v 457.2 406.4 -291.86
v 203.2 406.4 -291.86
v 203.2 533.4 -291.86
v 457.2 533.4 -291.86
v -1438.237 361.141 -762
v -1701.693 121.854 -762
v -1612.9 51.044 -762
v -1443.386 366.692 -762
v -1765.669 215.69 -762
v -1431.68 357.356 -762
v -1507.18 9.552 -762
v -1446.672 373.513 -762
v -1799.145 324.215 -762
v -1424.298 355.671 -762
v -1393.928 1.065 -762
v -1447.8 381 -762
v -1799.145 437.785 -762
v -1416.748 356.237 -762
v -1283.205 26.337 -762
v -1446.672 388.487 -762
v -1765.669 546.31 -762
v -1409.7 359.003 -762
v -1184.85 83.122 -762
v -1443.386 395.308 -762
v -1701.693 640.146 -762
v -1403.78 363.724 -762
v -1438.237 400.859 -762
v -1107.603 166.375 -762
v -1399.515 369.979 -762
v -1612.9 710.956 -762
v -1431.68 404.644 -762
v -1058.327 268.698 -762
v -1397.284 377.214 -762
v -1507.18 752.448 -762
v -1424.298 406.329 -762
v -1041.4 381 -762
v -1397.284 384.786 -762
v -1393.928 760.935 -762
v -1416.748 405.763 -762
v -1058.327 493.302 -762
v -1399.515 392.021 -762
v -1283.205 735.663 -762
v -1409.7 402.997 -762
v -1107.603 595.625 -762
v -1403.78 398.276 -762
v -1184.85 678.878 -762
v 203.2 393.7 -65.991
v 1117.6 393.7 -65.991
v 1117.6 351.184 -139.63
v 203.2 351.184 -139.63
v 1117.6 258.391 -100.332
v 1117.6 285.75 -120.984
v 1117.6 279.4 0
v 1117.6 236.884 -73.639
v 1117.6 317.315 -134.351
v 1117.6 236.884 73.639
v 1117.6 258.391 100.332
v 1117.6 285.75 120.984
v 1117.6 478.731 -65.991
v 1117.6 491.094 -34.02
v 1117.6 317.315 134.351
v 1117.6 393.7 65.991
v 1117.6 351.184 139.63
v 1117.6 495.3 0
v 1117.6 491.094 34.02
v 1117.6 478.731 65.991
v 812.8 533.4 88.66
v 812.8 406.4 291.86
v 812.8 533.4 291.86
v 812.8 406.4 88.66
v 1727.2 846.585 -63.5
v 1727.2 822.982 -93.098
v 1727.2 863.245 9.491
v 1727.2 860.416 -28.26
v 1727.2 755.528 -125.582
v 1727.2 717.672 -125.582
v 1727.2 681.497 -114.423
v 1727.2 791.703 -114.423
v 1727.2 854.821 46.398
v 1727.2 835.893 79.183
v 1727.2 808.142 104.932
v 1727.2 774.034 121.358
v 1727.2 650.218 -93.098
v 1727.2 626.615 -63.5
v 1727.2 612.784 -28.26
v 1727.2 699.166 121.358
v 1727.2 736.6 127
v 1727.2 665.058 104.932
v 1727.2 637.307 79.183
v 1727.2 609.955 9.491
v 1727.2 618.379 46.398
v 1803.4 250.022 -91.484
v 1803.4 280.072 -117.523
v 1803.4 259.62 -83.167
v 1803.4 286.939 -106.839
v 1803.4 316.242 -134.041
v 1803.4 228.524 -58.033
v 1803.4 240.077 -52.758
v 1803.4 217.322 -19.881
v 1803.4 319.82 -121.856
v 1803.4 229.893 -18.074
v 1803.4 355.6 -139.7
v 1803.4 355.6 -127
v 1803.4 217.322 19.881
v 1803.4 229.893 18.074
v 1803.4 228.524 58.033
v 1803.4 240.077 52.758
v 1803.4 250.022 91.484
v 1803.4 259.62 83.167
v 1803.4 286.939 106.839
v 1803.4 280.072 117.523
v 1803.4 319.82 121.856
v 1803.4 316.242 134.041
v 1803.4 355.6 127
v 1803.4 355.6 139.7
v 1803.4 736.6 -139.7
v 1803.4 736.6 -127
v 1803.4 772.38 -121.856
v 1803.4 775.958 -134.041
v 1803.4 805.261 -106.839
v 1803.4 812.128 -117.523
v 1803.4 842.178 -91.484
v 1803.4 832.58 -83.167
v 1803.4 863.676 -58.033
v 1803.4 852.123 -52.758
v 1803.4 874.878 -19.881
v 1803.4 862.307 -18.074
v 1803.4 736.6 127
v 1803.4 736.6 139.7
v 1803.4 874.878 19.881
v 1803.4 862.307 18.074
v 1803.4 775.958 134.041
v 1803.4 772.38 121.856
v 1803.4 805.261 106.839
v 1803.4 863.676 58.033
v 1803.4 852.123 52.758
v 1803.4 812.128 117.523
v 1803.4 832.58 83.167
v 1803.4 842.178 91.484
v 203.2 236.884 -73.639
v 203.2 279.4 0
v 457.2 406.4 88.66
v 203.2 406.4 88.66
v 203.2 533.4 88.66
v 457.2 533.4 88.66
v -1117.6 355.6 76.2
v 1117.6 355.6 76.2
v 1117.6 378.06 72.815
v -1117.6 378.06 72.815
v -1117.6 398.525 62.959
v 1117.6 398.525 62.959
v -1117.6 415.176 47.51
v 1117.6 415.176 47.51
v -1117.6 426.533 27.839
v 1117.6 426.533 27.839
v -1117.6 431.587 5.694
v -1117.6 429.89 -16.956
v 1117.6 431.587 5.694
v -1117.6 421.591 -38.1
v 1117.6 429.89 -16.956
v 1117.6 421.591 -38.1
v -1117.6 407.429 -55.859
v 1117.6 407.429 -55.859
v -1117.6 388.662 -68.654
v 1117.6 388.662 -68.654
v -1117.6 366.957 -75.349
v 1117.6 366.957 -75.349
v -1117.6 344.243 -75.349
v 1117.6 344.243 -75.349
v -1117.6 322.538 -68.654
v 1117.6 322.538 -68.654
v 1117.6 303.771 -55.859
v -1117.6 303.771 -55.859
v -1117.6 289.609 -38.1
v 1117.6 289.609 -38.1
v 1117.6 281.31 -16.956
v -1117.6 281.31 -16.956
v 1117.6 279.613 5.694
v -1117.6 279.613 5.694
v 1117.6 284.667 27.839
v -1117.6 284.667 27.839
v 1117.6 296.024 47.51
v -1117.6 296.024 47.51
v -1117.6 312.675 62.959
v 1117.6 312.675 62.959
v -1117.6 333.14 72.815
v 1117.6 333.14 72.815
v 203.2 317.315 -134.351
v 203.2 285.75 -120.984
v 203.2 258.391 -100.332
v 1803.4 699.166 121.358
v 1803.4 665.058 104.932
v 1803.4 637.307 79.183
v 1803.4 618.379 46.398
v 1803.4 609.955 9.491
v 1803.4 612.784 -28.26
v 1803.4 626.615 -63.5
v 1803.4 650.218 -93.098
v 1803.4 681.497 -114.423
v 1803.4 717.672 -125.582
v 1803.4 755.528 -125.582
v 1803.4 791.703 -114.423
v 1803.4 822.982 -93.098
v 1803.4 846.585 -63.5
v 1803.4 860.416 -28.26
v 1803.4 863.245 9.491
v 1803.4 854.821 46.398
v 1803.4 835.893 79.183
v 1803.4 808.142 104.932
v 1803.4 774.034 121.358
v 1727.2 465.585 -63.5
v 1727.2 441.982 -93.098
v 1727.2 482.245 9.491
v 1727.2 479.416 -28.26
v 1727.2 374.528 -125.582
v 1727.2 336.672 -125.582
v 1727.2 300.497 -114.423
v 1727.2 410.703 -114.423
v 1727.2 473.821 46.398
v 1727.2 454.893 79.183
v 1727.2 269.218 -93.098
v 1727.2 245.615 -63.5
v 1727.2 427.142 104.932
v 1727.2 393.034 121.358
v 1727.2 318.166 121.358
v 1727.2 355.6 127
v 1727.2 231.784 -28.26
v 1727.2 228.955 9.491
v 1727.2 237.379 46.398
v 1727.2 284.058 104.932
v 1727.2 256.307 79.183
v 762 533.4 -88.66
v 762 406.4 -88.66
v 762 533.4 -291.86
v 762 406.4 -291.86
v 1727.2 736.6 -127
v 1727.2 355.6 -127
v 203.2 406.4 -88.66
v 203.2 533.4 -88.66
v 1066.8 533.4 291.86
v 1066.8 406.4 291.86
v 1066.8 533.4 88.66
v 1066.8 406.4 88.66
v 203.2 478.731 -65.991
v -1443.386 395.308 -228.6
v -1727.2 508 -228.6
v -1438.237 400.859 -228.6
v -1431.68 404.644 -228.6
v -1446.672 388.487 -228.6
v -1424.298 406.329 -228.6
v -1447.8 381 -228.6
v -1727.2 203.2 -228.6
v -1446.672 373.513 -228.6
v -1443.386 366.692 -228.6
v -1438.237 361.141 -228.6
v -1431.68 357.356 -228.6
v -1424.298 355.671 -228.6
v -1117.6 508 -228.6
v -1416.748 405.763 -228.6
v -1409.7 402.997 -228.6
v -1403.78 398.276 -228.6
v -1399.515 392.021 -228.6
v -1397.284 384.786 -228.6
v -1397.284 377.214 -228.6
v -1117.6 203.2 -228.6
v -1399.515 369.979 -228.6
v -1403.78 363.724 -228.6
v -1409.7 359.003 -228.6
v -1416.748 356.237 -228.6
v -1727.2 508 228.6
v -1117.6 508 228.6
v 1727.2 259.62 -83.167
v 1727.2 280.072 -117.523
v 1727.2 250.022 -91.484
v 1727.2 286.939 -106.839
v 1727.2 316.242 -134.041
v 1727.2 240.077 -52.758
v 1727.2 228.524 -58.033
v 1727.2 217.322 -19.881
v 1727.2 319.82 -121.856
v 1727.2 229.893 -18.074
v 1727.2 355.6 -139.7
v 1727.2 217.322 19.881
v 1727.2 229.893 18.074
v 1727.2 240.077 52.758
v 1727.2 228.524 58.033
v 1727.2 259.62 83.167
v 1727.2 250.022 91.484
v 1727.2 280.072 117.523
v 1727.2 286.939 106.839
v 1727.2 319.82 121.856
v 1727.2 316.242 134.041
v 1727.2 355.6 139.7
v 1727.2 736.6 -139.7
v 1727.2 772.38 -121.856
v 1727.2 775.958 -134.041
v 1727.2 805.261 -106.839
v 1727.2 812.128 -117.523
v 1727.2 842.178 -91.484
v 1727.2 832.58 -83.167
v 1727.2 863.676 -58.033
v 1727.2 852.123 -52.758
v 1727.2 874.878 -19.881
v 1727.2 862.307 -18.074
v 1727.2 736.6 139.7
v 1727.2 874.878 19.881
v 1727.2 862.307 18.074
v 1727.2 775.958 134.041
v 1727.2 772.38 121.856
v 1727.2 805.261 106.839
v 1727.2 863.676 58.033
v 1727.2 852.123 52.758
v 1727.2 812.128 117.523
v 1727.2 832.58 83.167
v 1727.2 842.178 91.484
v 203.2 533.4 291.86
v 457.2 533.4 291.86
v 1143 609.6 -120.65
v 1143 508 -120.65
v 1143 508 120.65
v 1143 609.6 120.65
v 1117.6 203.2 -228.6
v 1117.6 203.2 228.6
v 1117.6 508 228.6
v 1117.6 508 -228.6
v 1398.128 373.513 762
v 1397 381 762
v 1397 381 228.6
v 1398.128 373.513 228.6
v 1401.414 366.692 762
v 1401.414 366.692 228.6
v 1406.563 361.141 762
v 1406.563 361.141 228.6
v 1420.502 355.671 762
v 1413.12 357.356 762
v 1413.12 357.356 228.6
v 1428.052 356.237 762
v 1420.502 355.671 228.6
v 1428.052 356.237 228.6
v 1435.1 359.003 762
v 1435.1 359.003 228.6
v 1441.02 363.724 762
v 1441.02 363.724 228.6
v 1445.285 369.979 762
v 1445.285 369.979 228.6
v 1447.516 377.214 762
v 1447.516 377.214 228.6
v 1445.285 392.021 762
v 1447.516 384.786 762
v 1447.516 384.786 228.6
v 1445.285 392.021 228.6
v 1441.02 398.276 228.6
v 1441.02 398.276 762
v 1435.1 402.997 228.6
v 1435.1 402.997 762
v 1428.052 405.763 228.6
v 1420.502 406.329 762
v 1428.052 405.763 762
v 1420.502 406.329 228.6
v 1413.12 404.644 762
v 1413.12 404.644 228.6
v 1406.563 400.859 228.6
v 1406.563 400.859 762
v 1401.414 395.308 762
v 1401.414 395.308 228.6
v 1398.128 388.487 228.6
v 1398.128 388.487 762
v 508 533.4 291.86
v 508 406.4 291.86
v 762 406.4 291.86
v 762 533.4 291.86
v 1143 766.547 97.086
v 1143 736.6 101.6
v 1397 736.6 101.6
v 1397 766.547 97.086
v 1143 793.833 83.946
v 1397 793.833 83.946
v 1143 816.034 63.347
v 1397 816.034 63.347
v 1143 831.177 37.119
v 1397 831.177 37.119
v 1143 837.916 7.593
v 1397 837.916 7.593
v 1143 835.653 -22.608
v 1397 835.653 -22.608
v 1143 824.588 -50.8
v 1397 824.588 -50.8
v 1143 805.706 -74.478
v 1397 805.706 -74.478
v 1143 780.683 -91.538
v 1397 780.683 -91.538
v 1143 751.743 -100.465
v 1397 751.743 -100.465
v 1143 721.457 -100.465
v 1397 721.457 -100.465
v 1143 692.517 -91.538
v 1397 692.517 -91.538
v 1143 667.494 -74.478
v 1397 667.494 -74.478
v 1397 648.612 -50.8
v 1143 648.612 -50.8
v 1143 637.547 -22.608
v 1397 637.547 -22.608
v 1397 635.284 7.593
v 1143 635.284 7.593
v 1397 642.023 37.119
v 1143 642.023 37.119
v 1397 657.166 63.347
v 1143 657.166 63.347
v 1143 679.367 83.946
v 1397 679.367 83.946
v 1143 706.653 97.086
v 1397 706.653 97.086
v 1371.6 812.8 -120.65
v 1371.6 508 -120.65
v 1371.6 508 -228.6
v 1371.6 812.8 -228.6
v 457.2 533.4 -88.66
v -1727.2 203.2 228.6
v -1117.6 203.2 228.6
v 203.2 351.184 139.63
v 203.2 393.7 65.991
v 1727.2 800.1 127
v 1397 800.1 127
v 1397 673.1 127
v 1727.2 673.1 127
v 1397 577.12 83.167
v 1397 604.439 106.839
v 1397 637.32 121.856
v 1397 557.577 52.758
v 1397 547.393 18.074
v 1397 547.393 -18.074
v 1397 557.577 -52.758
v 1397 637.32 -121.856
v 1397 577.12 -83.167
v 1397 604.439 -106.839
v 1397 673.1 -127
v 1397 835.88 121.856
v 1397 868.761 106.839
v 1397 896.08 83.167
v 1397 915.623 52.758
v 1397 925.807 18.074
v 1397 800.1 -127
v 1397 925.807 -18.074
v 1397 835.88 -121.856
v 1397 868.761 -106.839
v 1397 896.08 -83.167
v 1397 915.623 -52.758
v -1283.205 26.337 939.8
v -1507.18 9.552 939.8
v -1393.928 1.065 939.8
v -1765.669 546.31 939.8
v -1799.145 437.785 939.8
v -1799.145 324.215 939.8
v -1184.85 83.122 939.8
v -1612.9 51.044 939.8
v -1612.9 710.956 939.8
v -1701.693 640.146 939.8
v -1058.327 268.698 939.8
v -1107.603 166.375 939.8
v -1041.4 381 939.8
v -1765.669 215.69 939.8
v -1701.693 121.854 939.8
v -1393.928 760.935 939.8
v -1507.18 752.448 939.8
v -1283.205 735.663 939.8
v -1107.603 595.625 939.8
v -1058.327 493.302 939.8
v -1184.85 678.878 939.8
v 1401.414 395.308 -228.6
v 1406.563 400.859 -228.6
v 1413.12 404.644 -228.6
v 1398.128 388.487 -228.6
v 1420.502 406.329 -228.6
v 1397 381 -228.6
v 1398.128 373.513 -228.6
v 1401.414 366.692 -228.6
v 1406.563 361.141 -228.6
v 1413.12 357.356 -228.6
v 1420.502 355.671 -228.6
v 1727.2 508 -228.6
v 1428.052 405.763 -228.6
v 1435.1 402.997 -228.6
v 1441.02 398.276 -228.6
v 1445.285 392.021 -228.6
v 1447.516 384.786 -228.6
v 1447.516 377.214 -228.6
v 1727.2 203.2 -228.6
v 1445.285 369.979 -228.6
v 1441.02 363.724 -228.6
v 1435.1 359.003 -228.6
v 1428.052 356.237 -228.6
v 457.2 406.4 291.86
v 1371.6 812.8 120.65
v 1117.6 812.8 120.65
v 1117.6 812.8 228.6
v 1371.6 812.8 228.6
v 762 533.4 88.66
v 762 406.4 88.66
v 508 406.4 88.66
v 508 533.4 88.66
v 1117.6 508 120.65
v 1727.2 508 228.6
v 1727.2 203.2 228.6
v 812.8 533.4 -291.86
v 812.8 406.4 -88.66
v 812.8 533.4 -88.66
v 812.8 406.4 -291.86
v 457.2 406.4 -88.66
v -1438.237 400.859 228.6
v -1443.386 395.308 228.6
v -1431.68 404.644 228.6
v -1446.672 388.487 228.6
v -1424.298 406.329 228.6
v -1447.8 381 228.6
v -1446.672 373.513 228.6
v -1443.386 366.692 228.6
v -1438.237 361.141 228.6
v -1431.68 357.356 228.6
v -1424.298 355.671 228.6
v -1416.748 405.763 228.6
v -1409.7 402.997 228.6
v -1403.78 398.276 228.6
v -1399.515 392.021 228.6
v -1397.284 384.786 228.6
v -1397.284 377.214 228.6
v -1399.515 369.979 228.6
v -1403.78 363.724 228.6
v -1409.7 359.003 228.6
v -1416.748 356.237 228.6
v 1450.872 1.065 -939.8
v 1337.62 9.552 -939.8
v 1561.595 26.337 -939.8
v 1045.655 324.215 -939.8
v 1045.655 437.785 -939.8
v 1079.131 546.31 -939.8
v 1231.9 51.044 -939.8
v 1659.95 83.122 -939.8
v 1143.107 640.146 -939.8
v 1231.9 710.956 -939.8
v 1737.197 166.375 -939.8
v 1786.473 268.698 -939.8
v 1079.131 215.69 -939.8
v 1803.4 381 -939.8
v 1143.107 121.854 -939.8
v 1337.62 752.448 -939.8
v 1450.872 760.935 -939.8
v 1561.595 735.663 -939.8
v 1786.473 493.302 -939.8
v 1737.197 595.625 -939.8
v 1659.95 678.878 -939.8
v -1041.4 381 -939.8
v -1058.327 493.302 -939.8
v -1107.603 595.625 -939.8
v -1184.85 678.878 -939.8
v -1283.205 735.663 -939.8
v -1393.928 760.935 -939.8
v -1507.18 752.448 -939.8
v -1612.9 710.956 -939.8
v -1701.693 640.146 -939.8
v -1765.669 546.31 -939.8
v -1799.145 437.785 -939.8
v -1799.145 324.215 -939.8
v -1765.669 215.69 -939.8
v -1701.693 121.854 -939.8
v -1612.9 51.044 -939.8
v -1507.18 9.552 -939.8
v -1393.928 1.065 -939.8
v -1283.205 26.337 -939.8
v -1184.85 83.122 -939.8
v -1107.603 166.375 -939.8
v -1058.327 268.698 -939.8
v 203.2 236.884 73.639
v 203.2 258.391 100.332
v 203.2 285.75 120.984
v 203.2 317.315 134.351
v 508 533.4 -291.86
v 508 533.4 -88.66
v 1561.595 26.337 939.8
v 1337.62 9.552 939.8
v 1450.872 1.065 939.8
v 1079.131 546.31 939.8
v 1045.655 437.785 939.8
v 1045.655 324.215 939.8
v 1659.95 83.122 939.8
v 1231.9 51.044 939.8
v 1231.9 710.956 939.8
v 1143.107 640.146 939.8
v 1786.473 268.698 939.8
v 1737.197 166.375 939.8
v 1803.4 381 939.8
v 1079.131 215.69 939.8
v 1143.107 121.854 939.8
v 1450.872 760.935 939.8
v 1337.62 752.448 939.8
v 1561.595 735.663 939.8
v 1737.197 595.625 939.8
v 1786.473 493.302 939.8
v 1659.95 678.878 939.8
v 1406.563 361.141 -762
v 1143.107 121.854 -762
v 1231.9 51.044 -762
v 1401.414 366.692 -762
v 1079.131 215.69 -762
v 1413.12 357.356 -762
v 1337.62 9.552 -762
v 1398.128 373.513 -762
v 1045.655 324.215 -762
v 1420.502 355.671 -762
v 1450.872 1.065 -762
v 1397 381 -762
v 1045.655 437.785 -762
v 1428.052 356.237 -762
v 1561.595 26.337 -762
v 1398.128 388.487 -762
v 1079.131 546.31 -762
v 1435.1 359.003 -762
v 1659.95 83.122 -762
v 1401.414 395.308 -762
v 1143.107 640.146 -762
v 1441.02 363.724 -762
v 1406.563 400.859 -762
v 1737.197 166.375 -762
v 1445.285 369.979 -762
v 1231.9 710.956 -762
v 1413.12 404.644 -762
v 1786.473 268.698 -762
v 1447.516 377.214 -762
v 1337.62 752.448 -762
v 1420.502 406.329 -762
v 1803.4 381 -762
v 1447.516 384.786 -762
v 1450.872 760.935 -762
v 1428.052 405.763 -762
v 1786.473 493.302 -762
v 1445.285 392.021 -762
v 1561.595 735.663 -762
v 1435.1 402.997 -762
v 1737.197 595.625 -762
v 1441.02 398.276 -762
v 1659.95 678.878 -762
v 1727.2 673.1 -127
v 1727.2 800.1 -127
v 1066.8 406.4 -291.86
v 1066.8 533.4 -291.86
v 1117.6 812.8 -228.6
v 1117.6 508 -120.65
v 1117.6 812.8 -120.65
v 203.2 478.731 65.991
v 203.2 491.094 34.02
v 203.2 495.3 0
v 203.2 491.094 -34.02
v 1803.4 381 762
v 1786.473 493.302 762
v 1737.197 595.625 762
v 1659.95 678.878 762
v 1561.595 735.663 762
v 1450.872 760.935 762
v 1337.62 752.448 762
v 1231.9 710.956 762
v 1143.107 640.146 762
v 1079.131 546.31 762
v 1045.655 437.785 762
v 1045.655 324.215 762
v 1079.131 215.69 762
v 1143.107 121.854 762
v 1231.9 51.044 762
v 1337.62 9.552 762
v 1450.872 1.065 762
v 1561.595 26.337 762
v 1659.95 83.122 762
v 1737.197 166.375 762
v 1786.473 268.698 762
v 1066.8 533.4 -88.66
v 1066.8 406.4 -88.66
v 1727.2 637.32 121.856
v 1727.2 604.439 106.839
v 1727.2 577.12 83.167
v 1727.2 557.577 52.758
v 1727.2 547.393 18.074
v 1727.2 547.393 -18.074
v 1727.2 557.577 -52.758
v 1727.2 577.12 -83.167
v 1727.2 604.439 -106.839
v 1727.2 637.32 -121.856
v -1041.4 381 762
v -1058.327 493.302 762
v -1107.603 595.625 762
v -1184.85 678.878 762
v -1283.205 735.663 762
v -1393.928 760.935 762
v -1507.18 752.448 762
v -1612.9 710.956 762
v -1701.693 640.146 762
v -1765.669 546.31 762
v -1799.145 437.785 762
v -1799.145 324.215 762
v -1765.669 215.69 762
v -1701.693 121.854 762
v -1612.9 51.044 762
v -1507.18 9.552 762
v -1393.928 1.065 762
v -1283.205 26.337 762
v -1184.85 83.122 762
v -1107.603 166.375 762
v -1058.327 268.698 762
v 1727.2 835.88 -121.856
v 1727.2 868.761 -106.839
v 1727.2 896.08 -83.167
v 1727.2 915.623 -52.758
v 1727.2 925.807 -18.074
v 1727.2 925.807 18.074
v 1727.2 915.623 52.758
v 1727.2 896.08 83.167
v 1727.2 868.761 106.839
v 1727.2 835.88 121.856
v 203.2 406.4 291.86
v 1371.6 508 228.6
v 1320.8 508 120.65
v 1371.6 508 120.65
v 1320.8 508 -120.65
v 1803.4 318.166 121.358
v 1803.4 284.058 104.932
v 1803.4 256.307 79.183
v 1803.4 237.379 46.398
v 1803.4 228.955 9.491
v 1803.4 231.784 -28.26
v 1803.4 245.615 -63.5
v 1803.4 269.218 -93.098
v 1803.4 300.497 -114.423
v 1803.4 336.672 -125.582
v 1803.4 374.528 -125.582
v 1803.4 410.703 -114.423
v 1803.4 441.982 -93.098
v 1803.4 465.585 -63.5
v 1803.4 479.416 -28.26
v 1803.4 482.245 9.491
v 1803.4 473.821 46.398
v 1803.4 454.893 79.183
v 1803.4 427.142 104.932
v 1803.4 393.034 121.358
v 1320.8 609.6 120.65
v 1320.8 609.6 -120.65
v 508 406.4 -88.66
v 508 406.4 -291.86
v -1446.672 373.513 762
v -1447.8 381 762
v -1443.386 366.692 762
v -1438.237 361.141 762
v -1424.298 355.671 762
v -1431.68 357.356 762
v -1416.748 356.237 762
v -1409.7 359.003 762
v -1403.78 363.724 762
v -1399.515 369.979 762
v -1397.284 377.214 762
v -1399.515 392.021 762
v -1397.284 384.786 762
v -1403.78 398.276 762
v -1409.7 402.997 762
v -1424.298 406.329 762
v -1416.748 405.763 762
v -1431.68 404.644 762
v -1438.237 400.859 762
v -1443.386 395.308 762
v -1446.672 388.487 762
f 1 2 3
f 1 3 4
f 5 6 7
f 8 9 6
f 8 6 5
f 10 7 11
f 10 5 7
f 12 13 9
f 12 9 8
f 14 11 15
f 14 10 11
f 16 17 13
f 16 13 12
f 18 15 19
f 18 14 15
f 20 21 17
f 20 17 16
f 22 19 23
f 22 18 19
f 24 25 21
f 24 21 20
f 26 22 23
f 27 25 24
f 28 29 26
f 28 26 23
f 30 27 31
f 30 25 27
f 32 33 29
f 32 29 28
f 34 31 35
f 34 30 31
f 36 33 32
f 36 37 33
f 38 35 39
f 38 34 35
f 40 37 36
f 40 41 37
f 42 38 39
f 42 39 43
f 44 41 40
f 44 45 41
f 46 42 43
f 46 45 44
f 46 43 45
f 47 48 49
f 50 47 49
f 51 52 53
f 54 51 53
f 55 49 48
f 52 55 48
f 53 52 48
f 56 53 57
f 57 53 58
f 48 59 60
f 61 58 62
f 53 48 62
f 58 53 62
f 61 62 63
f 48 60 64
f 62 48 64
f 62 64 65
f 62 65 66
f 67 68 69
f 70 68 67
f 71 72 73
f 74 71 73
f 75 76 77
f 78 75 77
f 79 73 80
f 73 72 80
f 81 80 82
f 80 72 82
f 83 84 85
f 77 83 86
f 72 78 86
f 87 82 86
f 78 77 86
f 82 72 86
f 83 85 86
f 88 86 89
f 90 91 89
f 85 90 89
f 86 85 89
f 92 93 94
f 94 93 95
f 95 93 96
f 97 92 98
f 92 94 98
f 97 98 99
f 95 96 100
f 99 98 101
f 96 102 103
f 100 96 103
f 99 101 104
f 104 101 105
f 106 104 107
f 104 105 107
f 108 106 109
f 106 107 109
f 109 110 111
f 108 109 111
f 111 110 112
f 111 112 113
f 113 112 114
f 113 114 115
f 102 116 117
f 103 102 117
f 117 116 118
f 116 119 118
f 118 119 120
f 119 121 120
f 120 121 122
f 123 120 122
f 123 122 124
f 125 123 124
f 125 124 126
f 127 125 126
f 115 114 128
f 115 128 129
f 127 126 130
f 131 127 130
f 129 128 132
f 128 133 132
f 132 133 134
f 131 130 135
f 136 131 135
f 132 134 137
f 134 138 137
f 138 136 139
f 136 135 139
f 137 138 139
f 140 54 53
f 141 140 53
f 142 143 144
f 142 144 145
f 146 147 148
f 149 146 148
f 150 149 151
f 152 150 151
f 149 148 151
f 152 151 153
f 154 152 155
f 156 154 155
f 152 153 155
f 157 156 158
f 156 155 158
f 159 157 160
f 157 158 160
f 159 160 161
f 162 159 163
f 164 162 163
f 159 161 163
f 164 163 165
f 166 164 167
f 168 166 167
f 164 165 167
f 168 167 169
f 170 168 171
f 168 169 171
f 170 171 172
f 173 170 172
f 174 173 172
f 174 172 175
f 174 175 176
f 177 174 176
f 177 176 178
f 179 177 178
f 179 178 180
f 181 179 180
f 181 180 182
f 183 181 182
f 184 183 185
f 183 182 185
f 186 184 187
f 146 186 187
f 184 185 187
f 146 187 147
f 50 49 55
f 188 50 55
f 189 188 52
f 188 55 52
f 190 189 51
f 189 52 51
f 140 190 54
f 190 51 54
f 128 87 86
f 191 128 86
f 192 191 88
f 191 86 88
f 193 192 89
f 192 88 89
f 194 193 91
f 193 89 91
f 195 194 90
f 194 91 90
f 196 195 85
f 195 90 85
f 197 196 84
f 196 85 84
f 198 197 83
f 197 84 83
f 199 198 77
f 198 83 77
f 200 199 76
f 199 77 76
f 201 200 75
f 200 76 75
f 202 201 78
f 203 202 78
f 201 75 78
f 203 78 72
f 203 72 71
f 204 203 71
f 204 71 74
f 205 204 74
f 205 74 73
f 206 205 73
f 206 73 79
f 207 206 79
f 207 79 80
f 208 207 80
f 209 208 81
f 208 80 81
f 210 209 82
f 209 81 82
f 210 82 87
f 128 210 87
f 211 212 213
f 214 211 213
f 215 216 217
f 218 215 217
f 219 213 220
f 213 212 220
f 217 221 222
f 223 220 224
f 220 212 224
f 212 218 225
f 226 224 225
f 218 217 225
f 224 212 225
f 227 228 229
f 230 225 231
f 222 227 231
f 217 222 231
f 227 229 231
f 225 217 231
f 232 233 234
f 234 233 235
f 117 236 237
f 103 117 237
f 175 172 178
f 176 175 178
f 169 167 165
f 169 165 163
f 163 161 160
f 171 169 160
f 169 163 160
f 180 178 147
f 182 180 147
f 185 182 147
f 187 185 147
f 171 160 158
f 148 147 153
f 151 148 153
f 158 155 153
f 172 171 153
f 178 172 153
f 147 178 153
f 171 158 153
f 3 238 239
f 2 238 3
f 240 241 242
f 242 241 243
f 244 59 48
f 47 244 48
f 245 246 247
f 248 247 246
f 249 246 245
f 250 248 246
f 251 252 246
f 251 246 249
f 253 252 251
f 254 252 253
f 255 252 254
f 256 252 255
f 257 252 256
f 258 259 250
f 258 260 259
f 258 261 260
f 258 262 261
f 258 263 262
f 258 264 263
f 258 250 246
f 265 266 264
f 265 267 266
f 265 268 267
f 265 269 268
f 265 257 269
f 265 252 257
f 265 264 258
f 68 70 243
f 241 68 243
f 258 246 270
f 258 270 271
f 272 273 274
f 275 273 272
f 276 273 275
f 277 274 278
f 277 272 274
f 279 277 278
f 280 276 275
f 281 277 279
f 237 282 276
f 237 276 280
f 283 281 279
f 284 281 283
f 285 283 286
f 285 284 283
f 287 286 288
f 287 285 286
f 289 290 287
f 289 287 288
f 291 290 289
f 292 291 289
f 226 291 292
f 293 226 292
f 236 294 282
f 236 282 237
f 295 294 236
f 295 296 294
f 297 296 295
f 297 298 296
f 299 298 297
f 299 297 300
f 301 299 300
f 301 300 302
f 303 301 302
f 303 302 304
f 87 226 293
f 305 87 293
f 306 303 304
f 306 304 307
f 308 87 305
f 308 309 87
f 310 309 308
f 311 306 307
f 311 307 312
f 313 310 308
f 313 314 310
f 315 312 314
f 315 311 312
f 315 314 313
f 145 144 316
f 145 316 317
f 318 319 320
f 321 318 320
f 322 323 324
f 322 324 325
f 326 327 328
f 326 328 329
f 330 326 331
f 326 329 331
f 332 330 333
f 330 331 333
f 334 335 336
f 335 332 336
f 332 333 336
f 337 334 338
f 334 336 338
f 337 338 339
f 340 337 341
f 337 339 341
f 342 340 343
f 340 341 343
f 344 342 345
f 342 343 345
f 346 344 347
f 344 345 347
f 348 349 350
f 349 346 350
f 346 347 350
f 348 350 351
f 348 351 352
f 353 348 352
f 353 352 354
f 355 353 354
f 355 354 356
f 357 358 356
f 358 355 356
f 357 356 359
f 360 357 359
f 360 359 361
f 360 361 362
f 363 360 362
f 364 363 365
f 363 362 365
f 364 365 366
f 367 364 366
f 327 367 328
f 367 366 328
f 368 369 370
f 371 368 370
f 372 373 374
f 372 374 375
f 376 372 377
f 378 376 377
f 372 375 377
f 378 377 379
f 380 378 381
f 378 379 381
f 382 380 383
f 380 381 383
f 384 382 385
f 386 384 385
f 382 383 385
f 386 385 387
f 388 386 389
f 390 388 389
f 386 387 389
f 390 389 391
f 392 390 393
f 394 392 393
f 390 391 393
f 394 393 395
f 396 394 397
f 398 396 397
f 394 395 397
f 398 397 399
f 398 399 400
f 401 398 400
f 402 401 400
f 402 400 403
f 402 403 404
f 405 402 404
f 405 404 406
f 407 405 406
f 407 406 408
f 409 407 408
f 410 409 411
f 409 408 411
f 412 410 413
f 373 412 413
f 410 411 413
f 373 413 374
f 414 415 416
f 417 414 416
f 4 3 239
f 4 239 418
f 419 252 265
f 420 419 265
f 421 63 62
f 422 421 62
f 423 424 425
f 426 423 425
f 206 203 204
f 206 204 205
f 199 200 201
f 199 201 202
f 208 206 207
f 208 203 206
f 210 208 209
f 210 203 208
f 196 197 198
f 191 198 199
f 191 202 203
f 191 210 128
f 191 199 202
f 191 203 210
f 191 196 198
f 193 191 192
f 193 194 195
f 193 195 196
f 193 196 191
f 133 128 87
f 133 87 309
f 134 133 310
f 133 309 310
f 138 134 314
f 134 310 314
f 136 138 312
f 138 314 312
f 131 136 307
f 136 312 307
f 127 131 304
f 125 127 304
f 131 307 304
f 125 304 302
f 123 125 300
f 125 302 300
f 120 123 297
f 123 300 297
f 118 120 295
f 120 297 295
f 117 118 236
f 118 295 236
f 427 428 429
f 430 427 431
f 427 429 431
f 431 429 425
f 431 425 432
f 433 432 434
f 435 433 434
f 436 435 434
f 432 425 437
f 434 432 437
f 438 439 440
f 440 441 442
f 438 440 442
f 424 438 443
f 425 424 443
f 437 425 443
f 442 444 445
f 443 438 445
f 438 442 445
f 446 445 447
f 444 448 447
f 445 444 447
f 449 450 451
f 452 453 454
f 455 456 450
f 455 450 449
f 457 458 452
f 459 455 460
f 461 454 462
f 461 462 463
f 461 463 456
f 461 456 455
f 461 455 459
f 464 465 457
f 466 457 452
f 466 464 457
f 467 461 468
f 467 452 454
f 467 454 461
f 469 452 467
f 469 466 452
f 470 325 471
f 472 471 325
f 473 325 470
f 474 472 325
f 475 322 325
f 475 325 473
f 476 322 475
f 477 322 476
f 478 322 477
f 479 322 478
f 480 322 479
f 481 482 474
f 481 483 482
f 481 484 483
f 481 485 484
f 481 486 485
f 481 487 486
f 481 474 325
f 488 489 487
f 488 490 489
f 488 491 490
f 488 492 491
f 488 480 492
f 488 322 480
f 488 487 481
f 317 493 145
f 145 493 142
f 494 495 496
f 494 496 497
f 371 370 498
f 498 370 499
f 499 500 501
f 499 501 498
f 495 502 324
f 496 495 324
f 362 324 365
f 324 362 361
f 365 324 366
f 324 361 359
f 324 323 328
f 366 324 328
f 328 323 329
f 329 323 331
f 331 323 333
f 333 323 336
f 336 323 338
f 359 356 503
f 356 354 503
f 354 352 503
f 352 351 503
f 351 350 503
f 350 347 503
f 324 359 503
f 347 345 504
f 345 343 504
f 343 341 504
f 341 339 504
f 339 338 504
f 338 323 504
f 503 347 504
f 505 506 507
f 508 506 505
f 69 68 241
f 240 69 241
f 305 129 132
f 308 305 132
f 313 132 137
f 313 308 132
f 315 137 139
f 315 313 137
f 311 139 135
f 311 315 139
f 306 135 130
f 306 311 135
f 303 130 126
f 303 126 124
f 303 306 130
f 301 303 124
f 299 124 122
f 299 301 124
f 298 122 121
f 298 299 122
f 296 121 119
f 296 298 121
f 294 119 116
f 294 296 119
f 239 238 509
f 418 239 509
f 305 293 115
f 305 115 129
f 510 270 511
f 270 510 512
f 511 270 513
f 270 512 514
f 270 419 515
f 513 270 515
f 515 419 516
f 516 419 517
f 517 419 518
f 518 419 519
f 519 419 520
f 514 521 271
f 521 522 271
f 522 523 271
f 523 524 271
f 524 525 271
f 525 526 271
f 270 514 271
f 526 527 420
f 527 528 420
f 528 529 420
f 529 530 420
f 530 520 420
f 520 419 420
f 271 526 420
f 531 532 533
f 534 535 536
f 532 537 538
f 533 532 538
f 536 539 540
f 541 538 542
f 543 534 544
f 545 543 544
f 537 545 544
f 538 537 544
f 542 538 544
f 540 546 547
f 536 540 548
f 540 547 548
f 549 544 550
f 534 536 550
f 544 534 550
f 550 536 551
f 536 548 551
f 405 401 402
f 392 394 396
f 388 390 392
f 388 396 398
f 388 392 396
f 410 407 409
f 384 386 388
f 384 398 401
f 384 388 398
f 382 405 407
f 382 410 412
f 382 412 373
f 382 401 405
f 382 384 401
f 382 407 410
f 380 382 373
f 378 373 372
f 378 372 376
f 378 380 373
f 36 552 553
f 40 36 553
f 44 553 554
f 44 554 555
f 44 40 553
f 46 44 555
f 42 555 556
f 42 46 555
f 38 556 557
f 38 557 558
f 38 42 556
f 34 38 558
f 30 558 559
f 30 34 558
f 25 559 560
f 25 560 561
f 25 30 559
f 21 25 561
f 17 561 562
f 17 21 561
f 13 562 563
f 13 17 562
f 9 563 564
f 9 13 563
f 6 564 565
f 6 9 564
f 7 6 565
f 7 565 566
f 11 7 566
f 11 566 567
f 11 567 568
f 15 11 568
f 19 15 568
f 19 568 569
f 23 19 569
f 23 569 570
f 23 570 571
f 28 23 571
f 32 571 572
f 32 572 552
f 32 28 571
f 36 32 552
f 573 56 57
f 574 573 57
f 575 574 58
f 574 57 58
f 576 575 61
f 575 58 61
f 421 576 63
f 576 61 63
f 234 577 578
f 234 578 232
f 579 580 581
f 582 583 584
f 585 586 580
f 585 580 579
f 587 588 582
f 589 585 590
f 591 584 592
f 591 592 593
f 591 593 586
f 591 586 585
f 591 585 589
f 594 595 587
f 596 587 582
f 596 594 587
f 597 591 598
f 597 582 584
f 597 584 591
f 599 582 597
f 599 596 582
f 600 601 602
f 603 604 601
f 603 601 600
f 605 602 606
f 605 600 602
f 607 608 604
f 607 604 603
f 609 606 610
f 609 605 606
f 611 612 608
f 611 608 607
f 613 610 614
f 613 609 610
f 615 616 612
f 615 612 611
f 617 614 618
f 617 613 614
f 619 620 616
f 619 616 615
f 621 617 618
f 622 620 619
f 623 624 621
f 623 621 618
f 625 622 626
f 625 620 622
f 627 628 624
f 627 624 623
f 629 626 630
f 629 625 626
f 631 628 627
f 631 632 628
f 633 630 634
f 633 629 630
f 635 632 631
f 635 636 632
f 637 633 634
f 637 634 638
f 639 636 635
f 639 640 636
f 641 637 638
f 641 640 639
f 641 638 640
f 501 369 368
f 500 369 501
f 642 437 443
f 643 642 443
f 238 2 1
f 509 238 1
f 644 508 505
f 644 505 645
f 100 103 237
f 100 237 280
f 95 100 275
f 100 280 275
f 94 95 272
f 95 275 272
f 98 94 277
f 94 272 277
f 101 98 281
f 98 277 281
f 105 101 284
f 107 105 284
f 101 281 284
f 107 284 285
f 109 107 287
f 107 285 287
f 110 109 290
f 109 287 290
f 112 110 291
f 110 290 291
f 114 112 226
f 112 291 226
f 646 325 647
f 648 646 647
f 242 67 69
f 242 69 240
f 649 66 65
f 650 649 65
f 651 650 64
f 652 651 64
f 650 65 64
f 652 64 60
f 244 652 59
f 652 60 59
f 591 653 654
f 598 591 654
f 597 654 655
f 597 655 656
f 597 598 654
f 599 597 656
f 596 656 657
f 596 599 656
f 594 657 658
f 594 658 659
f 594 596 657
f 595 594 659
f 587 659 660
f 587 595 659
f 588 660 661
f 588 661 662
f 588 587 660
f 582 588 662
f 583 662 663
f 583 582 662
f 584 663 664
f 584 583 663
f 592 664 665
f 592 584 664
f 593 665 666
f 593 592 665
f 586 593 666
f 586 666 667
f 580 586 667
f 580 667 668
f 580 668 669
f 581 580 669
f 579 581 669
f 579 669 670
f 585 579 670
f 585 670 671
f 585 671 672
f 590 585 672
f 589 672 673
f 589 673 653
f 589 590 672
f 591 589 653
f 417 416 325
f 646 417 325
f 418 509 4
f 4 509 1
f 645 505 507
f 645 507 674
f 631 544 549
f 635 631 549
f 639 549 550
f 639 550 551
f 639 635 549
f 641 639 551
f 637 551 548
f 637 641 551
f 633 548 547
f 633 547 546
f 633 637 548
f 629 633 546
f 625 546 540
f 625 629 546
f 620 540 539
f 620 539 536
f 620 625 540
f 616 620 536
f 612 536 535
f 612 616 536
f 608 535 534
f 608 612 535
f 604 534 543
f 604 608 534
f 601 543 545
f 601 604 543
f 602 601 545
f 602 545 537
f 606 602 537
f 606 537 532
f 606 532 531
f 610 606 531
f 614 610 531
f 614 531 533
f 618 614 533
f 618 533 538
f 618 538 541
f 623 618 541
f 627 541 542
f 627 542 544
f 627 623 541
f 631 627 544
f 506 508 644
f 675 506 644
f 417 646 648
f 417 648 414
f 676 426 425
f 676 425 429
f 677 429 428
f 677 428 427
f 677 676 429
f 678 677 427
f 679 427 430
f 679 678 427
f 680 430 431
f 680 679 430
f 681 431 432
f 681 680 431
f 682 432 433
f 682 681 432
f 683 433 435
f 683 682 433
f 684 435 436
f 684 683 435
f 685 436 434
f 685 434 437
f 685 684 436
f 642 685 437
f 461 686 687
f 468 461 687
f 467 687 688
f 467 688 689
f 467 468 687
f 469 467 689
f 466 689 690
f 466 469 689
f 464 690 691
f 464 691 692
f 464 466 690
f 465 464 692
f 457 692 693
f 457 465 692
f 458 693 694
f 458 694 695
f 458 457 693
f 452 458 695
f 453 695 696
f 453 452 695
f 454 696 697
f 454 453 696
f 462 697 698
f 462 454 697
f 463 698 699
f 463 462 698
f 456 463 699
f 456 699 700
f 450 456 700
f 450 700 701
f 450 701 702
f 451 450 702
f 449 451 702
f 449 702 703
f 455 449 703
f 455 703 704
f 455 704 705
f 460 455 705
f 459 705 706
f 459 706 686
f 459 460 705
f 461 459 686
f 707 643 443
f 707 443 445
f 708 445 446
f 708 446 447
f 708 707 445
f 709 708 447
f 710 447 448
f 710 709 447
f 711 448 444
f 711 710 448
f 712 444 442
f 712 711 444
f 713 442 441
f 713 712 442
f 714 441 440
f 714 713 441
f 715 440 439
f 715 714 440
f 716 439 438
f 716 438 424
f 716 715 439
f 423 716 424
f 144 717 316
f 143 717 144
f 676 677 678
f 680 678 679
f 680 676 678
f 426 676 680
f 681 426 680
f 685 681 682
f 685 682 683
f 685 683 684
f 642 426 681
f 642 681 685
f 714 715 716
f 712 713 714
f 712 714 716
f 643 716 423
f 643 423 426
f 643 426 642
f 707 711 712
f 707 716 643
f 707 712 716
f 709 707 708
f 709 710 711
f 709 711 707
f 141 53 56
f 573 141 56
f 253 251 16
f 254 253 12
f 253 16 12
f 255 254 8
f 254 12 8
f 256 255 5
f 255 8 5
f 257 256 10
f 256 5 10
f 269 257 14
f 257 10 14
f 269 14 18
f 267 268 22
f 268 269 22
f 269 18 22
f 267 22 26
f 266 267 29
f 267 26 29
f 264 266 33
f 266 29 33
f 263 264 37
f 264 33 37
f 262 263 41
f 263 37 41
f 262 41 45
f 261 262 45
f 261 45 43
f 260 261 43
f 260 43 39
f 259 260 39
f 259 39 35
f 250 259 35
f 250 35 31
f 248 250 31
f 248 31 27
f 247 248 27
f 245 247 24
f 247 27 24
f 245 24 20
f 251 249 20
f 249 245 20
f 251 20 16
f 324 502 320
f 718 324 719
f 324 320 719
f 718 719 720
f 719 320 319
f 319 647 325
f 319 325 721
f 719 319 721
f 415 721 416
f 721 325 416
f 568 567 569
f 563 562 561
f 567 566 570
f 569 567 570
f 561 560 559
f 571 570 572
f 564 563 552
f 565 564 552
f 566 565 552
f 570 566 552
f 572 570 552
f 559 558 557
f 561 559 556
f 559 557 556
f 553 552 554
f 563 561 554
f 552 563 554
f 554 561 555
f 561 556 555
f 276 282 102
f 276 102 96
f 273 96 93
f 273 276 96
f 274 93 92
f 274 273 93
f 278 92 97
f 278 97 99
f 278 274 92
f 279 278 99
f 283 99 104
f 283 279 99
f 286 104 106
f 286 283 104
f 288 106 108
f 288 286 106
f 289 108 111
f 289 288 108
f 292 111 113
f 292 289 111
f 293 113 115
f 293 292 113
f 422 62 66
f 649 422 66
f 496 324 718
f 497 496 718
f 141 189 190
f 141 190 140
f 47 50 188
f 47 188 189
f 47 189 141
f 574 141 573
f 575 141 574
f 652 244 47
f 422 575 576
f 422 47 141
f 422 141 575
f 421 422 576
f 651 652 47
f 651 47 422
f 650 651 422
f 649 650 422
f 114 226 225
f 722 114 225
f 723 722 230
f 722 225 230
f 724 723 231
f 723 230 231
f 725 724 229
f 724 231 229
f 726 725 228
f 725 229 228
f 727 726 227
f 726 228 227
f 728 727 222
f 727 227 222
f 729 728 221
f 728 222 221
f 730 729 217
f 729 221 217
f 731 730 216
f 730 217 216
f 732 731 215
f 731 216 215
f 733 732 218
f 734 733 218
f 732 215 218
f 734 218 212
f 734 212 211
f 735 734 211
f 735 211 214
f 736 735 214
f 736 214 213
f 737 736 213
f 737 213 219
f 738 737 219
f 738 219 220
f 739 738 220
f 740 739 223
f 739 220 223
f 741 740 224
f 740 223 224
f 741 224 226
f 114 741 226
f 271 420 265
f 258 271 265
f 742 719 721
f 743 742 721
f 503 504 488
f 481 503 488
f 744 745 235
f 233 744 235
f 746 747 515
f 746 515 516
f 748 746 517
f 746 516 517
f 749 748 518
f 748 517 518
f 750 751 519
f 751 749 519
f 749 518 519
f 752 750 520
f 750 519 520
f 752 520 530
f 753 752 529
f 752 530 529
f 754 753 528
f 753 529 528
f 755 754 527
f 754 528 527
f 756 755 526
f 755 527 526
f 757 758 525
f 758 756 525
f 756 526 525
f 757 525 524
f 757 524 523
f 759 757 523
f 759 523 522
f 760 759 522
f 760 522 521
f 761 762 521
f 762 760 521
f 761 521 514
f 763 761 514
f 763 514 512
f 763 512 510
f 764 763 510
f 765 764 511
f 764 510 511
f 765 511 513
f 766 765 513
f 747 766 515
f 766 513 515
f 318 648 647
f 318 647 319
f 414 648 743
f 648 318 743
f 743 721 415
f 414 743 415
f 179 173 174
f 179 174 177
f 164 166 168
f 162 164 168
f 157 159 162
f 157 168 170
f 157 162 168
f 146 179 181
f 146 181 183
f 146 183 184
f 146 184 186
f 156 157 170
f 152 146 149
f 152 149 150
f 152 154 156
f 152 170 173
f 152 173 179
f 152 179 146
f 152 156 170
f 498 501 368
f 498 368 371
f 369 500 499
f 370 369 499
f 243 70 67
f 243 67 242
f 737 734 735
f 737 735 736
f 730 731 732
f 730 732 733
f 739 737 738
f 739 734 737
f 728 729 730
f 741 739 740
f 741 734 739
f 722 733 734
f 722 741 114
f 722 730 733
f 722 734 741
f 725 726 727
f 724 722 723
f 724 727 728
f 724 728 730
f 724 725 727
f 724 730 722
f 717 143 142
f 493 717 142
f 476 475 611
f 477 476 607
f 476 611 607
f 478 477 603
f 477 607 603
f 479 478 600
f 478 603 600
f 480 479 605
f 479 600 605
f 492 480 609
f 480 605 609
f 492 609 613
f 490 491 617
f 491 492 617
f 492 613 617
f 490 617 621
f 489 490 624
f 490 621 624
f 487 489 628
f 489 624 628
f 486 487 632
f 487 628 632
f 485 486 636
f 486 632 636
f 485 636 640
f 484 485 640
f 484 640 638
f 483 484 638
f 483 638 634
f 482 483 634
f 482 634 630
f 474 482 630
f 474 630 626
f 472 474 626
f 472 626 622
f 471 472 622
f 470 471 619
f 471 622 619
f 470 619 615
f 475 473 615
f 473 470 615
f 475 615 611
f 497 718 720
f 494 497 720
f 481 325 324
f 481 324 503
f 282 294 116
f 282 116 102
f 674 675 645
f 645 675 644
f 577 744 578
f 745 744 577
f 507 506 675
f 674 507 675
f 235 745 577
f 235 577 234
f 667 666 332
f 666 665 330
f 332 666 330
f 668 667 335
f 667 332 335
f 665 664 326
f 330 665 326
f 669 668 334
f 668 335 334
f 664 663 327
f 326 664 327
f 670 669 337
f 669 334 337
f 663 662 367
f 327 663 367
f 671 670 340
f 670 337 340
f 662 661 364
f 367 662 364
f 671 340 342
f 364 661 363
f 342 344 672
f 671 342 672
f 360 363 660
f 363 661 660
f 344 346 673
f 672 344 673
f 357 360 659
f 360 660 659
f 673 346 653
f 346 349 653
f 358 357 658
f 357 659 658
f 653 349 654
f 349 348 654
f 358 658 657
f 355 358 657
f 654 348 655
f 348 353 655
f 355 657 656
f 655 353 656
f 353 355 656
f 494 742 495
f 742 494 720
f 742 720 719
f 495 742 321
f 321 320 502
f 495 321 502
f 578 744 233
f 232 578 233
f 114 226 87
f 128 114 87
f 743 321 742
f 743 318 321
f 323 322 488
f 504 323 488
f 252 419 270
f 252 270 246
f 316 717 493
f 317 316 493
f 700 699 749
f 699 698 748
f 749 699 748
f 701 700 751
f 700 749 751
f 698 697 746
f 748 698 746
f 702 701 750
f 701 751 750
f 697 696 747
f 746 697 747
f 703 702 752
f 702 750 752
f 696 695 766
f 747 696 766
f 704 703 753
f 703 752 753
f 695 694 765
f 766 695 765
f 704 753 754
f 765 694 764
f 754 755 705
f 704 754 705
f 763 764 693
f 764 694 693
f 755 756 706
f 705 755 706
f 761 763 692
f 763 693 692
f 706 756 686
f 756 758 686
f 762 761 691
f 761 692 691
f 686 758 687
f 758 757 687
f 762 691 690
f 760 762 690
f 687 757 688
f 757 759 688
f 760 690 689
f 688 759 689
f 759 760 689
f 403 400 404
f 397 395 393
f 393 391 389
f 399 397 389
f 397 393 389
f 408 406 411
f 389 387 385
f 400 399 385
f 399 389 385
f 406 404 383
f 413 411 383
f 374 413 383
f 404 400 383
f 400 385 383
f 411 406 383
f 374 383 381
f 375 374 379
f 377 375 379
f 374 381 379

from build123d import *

# Parameters (mm, degrees)
SKETCH4_R              = 381
BOSS_EXTRUDE1_DEPTH    = 88.9
BOSS_EXTRUDE1_2_DEPTH  = 88.9
SKETCH3_R              = 381
BOSS_EXTRUDE2_DEPTH    = 88.9
BOSS_EXTRUDE2_2_DEPTH  = 88.9
BOSS_EXTRUDE3_START    = 203.2
SKETCH1_W              = 609.6
SKETCH1_H              = 457.2
BOSS_EXTRUDE3_DEPTH    = 304.8
BOSS_EXTRUDE3_2_DEPTH  = 304.8
SKETCH5_R              = 76.2
BOSS_EXTRUDE4_DEPTH    = 914.4
SKETCH5_3_R            = 76.2
BOSS_EXTRUDE5_DEPTH    = 2235.2
SKETCH6_R              = 127
BOSS_EXTRUDE6_DEPTH    = 76.2
BOSS_EXTRUDE6_2_DEPTH  = 76.2
BOSS_EXTRUDE8_DEPTH    = 330.2
SKETCH9_R              = 101.6
BOSS_EXTRUDE9_DEPTH    = 254
BOSS_EXTRUDE10_DEPTH   = 76.2
SKETCH11_W             = 254
SKETCH11_H             = 203.2
BOSS_EXTRUDE11_DEPTH   = 127
BOSS_EXTRUDE11_2_DEPTH = 127
BOSS_EXTRUDE11_3_DEPTH = 127
BOSS_EXTRUDE11_4_DEPTH = 127
BOSS_EXTRUDE11_5_DEPTH = 127
BOSS_EXTRUDE11_6_DEPTH = 127
BOSS_EXTRUDE12_DEPTH   = 304.8
BOSS_EXTRUDE12_2_DEPTH = 304.8
SKETCH12_3_W           = 177.8
SKETCH12_3_H           = 120.65
BOSS_EXTRUDE13_DEPTH   = 101.6
BOSS_EXTRUDE15_REACH   = 2649.242
SKETCH13_R             = 25.4


with BuildPart() as part:
    # Sketch4 → Boss-Extrude1 (new, symmetric)
    with BuildSketch(Plane.XY.offset(-850.9)):
        with Locations((1422.4, 381)):
            Circle(SKETCH4_R)
    extrude(amount=BOSS_EXTRUDE1_DEPTH, both=True)


with BuildPart() as body_2:
    # Sketch4 → Boss-Extrude1 2 (new, symmetric)
    with BuildSketch(Plane.XY.offset(-850.9)):
        with Locations((-1422.4, 381)):
            Circle(SKETCH4_R)
    extrude(amount=BOSS_EXTRUDE1_2_DEPTH, both=True)


with BuildPart() as body_3:
    # Sketch3 → Boss-Extrude2 (new, symmetric)
    with BuildSketch(Plane.XY.offset(850.9)):
        with Locations((1422.4, 381)):
            Circle(SKETCH3_R)
    extrude(amount=BOSS_EXTRUDE2_DEPTH, both=True)


with BuildPart() as body_4:
    # Sketch3 → Boss-Extrude2 2 (new, symmetric)
    with BuildSketch(Plane.XY.offset(850.9)):
        with Locations((-1422.4, 381)):
            Circle(SKETCH3_R)
    extrude(amount=BOSS_EXTRUDE2_2_DEPTH, both=True)

    # Boss-Extrude15: up to this face of the body (flat: up to its plane)
    boss_extrude15_end = Plane(body_4.part.faces().sort_by_distance((-1422.4, 381, 762))[0])
    # Sketch13 → Boss-Extrude15 (add, up to the picked face)
    with BuildSketch(Plane.XY.offset(-762), mode=Mode.PRIVATE) as boss_extrude15_sk1:
        with Locations(Location((-1422.4, 381, 0), (0, 0, 180))):
            Circle(SKETCH13_R)
    boss_extrude15_tool1 = split(extrude(boss_extrude15_sk1.sketch, amount=BOSS_EXTRUDE15_REACH, mode=Mode.PRIVATE), bisect_by=boss_extrude15_end, keep=Keep.BOTH, mode=Mode.PRIVATE)
    # Sketch13 → Boss-Extrude15 (add, up to the picked face)
    with BuildSketch(Plane.XY.offset(-762), mode=Mode.PRIVATE) as boss_extrude15_sk2:
        with Locations(Location((1422.4, 381, 0), (0, 0, 180))):
            Circle(SKETCH13_R)
    boss_extrude15_tool2 = split(extrude(boss_extrude15_sk2.sketch, amount=BOSS_EXTRUDE15_REACH, mode=Mode.PRIVATE), bisect_by=boss_extrude15_end, keep=Keep.BOTH, mode=Mode.PRIVATE)

    add(part.part)  # Boss-Extrude15 merges part

    add(body_2.part)  # Boss-Extrude15 merges body 2

    add(body_3.part)  # Boss-Extrude15 merges body 3


with BuildPart() as body_5:
    # Sketch1 → Boss-Extrude3 (new body)
    with BuildSketch(Plane(origin=(0, 0, 0), x_dir=(1, 0, 0), z_dir=(0, 1, 0)).offset(BOSS_EXTRUDE3_START)):
        with Locations((1422.4, 0)):
            Rectangle(SKETCH1_W, SKETCH1_H)
    extrude(amount=BOSS_EXTRUDE3_DEPTH)


with BuildPart() as body_6:
    # Sketch1 → Boss-Extrude3 2 (new body)
    with BuildSketch(Plane(origin=(0, 0, 0), x_dir=(1, 0, 0), z_dir=(0, 1, 0)).offset(BOSS_EXTRUDE3_START)):
        with Locations((-1422.4, 0)):
            Rectangle(SKETCH1_W, SKETCH1_H)
    extrude(amount=BOSS_EXTRUDE3_2_DEPTH)


with BuildPart() as body_7:
    # Sketch5 → Boss-Extrude4 (new body)
    with BuildSketch(Plane.ZY.offset(-1117.6)):
        with BuildLine():
            Line((-65.991135768, 478.731068378), (-65.991135768, 393.7))
            ThreePointArc((-65.991135768, 393.7), (0, 431.8), (65.991135768, 393.7))
            Line((65.991135768, 393.7), (65.991135768, 478.731068378))
            ThreePointArc((65.991135768, 478.731068378), (0, 495.3), (-65.991135768, 478.731068378))
        make_face()
        with BuildLine():
            Line((139.630201095, 351.184465811), (65.991135768, 393.7))
            ThreePointArc((65.991135768, 393.7), (73.603547963, 375.322011237), (76.2, 355.6))
            ThreePointArc((76.2, 355.6), (53.881536726, 301.718463274), (0, 279.4))
            Line((0, 279.4), (73.639065327, 236.884465811))
            ThreePointArc((73.639065327, 236.884465811), (120.983748909, 285.75), (139.630201095, 351.184465811))
        make_face()
        with BuildLine():
            ThreePointArc((0, 279.4), (-65.991135768, 317.5), (-65.991135768, 393.7))
            Line((-65.991135768, 393.7), (-139.630201095, 351.184465811))
            ThreePointArc((-139.630201095, 351.184465811), (-120.983748909, 285.75), (-73.639065327, 236.884465811))
            Line((-73.639065327, 236.884465811), (0, 279.4))
        make_face()
        with Locations((0, 355.6)):
            Circle(SKETCH5_R)
    extrude(amount=BOSS_EXTRUDE4_DEPTH)


with BuildPart() as body_8:
    # Sketch5<3> → Boss-Extrude5 (new body)
    with BuildSketch(Plane.ZY.offset(-1117.6)):
        with Locations((0, 355.6)):
            Circle(SKETCH5_3_R)
    extrude(amount=BOSS_EXTRUDE5_DEPTH)


with BuildPart() as body_9:
    # Sketch6 → Boss-Extrude6 (new body)
    with BuildSketch(Plane(origin=(1727.2, 0, 0), x_dir=(0, 0, -1), z_dir=(1, 0, 0))):
        with Locations(Location((0, 355.6, 0), (0, 0, 180))):
            Circle(SKETCH6_R)
    extrude(amount=BOSS_EXTRUDE6_DEPTH)


with BuildPart() as body_10:
    # Sketch6 → Boss-Extrude6 2 (new body)
    with BuildSketch(Plane(origin=(1727.2, 0, 0), x_dir=(0, 0, -1), z_dir=(1, 0, 0))):
        with Locations(Location((0, 736.6, 0), (0, 0, 180))):
            Circle(SKETCH6_R)
    extrude(amount=BOSS_EXTRUDE6_2_DEPTH)


with BuildPart() as body_11:
    # Sketch8 → Boss-Extrude8 (new body)
    with BuildSketch(Plane.ZY.offset(-1727.2)):
        with BuildLine():
            Line((-127, 673.1), (-127, 800.1))
            ThreePointArc((-127, 800.1), (0, 927.1), (127, 800.1))
            Line((127, 800.1), (127, 673.1))
            ThreePointArc((127, 673.1), (0, 546.1), (-127, 673.1))
        make_face()
    extrude(amount=BOSS_EXTRUDE8_DEPTH)


with BuildPart() as body_12:
    # Sketch9 → Boss-Extrude9 (new body)
    with BuildSketch(Plane.ZY.offset(-1397)):
        with Locations((0, 736.6)):
            Circle(SKETCH9_R)
    extrude(amount=BOSS_EXTRUDE9_DEPTH)


with BuildPart() as body_13:
    # Sketch6<3> → Boss-Extrude10 (new body)
    with BuildSketch(Plane(origin=(1727.2, 0, 0), x_dir=(0, 0, -1), z_dir=(1, 0, 0))):
        with BuildLine():
            Line((139.7, 736.6), (139.7, 355.6))
            ThreePointArc((139.7, 355.6), (0, 215.9), (-139.7, 355.6))
            Line((-139.7, 355.6), (-139.7, 736.6))
            ThreePointArc((-139.7, 736.6), (0, 876.3), (139.7, 736.6))
        make_face()
        with BuildLine():
            Line((-127, 355.6), (-127, 736.6))
            ThreePointArc((-127, 736.6), (0, 863.6), (127, 736.6))
            Line((127, 736.6), (127, 355.6))
            ThreePointArc((127, 355.6), (0, 228.6), (-127, 355.6))
        make_face(mode=Mode.SUBTRACT)
    extrude(amount=BOSS_EXTRUDE10_DEPTH)


with BuildPart() as body_14:
    # Sketch11 → Boss-Extrude11 (new body)
    with BuildSketch(Plane(origin=(0, 406.4, 0), x_dir=(1, 0, 0), z_dir=(0, 1, 0))):
        with Locations((635, -190.260072631)):
            Rectangle(SKETCH11_W, SKETCH11_H)
    extrude(amount=BOSS_EXTRUDE11_DEPTH)


with BuildPart() as body_15:
    # Sketch11 → Boss-Extrude11 2 (new body)
    with BuildSketch(Plane(origin=(0, 406.4, 0), x_dir=(1, 0, 0), z_dir=(0, 1, 0))):
        with Locations((330.2, -190.260072631)):
            Rectangle(SKETCH11_W, SKETCH11_H)
    extrude(amount=BOSS_EXTRUDE11_2_DEPTH)


with BuildPart() as body_16:
    # Sketch11 → Boss-Extrude11 3 (new body)
    with BuildSketch(Plane(origin=(0, 406.4, 0), x_dir=(1, 0, 0), z_dir=(0, 1, 0))):
        with Locations((939.8, -190.260072631)):
            Rectangle(SKETCH11_W, SKETCH11_H)
    extrude(amount=BOSS_EXTRUDE11_3_DEPTH)


with BuildPart() as body_17:
    # Sketch11 → Boss-Extrude11 4 (new body)
    with BuildSketch(Plane(origin=(0, 406.4, 0), x_dir=(1, 0, 0), z_dir=(0, 1, 0))):
        with Locations((939.8, 190.260072631)):
            Rectangle(SKETCH11_W, SKETCH11_H)
    extrude(amount=BOSS_EXTRUDE11_4_DEPTH)


with BuildPart() as body_18:
    # Sketch11 → Boss-Extrude11 5 (new body)
    with BuildSketch(Plane(origin=(0, 406.4, 0), x_dir=(1, 0, 0), z_dir=(0, 1, 0))):
        with Locations((635, 190.260072631)):
            Rectangle(SKETCH11_W, SKETCH11_H)
    extrude(amount=BOSS_EXTRUDE11_5_DEPTH)


with BuildPart() as body_19:
    # Sketch11 → Boss-Extrude11 6 (new body)
    with BuildSketch(Plane(origin=(0, 406.4, 0), x_dir=(1, 0, 0), z_dir=(0, 1, 0))):
        with Locations((330.2, 190.260072631)):
            Rectangle(SKETCH11_W, SKETCH11_H)
    extrude(amount=BOSS_EXTRUDE11_6_DEPTH)


with BuildPart() as body_20:
    # Sketch12 → Boss-Extrude12 (new body)
    with BuildSketch(Plane(origin=(0, 508, 0), x_dir=(1, 0, 0), z_dir=(0, 1, 0))):
        Polygon((1371.6, 228.6), (1117.6, 228.6), (1117.6, 120.65), (1143, 120.65), (1320.8, 120.65), (1371.6, 120.65), align=None)
    extrude(amount=BOSS_EXTRUDE12_DEPTH)



with BuildPart() as body_21:
    # Sketch12 → Boss-Extrude12 2 (new body)
    with BuildSketch(Plane(origin=(0, 508, 0), x_dir=(1, 0, 0), z_dir=(0, 1, 0))):
        Polygon((1143, -120.65), (1117.6, -120.65), (1117.6, -228.6), (1371.6, -228.6), (1371.6, -120.65), (1320.8, -120.65), align=None)
    extrude(amount=BOSS_EXTRUDE12_2_DEPTH)


with BuildPart() as body_20_1:
    add(body_20.part)

    add(body_21.part)  # Boss-Extrude13 merges body 21
    # Sketch12<3> → Boss-Extrude13 (add)
    with BuildSketch(Plane(origin=(0, 508, 0), x_dir=(1, 0, 0), z_dir=(0, 1, 0))):
        with Locations((1231.9, -60.325)):
            Rectangle(SKETCH12_3_W, SKETCH12_3_H)
        with Locations((1231.9, 60.325)):
            Rectangle(SKETCH12_3_W, SKETCH12_3_H)
    extrude(amount=BOSS_EXTRUDE13_DEPTH)


with BuildPart() as body_4_1:
    add(body_4.part)

    add(body_5.part)  # Boss-Extrude15 merges body 5

    add(body_6.part)  # Boss-Extrude15 merges body 6
    add(boss_extrude15_tool1.solids().sort_by(Axis((-1422.4, 381, -762), (0, 0, 1)))[0])
    add(boss_extrude15_tool2.solids().sort_by(Axis((1422.4, 381, -762), (0, 0, 1)))[0])


solid = Compound([body_7.part, body_8.part, body_9.part, body_10.part, body_11.part, body_12.part, body_13.part, body_14.part, body_15.part, body_16.part, body_17.part, body_18.part, body_19.part, body_20_1.part, body_4_1.part])
